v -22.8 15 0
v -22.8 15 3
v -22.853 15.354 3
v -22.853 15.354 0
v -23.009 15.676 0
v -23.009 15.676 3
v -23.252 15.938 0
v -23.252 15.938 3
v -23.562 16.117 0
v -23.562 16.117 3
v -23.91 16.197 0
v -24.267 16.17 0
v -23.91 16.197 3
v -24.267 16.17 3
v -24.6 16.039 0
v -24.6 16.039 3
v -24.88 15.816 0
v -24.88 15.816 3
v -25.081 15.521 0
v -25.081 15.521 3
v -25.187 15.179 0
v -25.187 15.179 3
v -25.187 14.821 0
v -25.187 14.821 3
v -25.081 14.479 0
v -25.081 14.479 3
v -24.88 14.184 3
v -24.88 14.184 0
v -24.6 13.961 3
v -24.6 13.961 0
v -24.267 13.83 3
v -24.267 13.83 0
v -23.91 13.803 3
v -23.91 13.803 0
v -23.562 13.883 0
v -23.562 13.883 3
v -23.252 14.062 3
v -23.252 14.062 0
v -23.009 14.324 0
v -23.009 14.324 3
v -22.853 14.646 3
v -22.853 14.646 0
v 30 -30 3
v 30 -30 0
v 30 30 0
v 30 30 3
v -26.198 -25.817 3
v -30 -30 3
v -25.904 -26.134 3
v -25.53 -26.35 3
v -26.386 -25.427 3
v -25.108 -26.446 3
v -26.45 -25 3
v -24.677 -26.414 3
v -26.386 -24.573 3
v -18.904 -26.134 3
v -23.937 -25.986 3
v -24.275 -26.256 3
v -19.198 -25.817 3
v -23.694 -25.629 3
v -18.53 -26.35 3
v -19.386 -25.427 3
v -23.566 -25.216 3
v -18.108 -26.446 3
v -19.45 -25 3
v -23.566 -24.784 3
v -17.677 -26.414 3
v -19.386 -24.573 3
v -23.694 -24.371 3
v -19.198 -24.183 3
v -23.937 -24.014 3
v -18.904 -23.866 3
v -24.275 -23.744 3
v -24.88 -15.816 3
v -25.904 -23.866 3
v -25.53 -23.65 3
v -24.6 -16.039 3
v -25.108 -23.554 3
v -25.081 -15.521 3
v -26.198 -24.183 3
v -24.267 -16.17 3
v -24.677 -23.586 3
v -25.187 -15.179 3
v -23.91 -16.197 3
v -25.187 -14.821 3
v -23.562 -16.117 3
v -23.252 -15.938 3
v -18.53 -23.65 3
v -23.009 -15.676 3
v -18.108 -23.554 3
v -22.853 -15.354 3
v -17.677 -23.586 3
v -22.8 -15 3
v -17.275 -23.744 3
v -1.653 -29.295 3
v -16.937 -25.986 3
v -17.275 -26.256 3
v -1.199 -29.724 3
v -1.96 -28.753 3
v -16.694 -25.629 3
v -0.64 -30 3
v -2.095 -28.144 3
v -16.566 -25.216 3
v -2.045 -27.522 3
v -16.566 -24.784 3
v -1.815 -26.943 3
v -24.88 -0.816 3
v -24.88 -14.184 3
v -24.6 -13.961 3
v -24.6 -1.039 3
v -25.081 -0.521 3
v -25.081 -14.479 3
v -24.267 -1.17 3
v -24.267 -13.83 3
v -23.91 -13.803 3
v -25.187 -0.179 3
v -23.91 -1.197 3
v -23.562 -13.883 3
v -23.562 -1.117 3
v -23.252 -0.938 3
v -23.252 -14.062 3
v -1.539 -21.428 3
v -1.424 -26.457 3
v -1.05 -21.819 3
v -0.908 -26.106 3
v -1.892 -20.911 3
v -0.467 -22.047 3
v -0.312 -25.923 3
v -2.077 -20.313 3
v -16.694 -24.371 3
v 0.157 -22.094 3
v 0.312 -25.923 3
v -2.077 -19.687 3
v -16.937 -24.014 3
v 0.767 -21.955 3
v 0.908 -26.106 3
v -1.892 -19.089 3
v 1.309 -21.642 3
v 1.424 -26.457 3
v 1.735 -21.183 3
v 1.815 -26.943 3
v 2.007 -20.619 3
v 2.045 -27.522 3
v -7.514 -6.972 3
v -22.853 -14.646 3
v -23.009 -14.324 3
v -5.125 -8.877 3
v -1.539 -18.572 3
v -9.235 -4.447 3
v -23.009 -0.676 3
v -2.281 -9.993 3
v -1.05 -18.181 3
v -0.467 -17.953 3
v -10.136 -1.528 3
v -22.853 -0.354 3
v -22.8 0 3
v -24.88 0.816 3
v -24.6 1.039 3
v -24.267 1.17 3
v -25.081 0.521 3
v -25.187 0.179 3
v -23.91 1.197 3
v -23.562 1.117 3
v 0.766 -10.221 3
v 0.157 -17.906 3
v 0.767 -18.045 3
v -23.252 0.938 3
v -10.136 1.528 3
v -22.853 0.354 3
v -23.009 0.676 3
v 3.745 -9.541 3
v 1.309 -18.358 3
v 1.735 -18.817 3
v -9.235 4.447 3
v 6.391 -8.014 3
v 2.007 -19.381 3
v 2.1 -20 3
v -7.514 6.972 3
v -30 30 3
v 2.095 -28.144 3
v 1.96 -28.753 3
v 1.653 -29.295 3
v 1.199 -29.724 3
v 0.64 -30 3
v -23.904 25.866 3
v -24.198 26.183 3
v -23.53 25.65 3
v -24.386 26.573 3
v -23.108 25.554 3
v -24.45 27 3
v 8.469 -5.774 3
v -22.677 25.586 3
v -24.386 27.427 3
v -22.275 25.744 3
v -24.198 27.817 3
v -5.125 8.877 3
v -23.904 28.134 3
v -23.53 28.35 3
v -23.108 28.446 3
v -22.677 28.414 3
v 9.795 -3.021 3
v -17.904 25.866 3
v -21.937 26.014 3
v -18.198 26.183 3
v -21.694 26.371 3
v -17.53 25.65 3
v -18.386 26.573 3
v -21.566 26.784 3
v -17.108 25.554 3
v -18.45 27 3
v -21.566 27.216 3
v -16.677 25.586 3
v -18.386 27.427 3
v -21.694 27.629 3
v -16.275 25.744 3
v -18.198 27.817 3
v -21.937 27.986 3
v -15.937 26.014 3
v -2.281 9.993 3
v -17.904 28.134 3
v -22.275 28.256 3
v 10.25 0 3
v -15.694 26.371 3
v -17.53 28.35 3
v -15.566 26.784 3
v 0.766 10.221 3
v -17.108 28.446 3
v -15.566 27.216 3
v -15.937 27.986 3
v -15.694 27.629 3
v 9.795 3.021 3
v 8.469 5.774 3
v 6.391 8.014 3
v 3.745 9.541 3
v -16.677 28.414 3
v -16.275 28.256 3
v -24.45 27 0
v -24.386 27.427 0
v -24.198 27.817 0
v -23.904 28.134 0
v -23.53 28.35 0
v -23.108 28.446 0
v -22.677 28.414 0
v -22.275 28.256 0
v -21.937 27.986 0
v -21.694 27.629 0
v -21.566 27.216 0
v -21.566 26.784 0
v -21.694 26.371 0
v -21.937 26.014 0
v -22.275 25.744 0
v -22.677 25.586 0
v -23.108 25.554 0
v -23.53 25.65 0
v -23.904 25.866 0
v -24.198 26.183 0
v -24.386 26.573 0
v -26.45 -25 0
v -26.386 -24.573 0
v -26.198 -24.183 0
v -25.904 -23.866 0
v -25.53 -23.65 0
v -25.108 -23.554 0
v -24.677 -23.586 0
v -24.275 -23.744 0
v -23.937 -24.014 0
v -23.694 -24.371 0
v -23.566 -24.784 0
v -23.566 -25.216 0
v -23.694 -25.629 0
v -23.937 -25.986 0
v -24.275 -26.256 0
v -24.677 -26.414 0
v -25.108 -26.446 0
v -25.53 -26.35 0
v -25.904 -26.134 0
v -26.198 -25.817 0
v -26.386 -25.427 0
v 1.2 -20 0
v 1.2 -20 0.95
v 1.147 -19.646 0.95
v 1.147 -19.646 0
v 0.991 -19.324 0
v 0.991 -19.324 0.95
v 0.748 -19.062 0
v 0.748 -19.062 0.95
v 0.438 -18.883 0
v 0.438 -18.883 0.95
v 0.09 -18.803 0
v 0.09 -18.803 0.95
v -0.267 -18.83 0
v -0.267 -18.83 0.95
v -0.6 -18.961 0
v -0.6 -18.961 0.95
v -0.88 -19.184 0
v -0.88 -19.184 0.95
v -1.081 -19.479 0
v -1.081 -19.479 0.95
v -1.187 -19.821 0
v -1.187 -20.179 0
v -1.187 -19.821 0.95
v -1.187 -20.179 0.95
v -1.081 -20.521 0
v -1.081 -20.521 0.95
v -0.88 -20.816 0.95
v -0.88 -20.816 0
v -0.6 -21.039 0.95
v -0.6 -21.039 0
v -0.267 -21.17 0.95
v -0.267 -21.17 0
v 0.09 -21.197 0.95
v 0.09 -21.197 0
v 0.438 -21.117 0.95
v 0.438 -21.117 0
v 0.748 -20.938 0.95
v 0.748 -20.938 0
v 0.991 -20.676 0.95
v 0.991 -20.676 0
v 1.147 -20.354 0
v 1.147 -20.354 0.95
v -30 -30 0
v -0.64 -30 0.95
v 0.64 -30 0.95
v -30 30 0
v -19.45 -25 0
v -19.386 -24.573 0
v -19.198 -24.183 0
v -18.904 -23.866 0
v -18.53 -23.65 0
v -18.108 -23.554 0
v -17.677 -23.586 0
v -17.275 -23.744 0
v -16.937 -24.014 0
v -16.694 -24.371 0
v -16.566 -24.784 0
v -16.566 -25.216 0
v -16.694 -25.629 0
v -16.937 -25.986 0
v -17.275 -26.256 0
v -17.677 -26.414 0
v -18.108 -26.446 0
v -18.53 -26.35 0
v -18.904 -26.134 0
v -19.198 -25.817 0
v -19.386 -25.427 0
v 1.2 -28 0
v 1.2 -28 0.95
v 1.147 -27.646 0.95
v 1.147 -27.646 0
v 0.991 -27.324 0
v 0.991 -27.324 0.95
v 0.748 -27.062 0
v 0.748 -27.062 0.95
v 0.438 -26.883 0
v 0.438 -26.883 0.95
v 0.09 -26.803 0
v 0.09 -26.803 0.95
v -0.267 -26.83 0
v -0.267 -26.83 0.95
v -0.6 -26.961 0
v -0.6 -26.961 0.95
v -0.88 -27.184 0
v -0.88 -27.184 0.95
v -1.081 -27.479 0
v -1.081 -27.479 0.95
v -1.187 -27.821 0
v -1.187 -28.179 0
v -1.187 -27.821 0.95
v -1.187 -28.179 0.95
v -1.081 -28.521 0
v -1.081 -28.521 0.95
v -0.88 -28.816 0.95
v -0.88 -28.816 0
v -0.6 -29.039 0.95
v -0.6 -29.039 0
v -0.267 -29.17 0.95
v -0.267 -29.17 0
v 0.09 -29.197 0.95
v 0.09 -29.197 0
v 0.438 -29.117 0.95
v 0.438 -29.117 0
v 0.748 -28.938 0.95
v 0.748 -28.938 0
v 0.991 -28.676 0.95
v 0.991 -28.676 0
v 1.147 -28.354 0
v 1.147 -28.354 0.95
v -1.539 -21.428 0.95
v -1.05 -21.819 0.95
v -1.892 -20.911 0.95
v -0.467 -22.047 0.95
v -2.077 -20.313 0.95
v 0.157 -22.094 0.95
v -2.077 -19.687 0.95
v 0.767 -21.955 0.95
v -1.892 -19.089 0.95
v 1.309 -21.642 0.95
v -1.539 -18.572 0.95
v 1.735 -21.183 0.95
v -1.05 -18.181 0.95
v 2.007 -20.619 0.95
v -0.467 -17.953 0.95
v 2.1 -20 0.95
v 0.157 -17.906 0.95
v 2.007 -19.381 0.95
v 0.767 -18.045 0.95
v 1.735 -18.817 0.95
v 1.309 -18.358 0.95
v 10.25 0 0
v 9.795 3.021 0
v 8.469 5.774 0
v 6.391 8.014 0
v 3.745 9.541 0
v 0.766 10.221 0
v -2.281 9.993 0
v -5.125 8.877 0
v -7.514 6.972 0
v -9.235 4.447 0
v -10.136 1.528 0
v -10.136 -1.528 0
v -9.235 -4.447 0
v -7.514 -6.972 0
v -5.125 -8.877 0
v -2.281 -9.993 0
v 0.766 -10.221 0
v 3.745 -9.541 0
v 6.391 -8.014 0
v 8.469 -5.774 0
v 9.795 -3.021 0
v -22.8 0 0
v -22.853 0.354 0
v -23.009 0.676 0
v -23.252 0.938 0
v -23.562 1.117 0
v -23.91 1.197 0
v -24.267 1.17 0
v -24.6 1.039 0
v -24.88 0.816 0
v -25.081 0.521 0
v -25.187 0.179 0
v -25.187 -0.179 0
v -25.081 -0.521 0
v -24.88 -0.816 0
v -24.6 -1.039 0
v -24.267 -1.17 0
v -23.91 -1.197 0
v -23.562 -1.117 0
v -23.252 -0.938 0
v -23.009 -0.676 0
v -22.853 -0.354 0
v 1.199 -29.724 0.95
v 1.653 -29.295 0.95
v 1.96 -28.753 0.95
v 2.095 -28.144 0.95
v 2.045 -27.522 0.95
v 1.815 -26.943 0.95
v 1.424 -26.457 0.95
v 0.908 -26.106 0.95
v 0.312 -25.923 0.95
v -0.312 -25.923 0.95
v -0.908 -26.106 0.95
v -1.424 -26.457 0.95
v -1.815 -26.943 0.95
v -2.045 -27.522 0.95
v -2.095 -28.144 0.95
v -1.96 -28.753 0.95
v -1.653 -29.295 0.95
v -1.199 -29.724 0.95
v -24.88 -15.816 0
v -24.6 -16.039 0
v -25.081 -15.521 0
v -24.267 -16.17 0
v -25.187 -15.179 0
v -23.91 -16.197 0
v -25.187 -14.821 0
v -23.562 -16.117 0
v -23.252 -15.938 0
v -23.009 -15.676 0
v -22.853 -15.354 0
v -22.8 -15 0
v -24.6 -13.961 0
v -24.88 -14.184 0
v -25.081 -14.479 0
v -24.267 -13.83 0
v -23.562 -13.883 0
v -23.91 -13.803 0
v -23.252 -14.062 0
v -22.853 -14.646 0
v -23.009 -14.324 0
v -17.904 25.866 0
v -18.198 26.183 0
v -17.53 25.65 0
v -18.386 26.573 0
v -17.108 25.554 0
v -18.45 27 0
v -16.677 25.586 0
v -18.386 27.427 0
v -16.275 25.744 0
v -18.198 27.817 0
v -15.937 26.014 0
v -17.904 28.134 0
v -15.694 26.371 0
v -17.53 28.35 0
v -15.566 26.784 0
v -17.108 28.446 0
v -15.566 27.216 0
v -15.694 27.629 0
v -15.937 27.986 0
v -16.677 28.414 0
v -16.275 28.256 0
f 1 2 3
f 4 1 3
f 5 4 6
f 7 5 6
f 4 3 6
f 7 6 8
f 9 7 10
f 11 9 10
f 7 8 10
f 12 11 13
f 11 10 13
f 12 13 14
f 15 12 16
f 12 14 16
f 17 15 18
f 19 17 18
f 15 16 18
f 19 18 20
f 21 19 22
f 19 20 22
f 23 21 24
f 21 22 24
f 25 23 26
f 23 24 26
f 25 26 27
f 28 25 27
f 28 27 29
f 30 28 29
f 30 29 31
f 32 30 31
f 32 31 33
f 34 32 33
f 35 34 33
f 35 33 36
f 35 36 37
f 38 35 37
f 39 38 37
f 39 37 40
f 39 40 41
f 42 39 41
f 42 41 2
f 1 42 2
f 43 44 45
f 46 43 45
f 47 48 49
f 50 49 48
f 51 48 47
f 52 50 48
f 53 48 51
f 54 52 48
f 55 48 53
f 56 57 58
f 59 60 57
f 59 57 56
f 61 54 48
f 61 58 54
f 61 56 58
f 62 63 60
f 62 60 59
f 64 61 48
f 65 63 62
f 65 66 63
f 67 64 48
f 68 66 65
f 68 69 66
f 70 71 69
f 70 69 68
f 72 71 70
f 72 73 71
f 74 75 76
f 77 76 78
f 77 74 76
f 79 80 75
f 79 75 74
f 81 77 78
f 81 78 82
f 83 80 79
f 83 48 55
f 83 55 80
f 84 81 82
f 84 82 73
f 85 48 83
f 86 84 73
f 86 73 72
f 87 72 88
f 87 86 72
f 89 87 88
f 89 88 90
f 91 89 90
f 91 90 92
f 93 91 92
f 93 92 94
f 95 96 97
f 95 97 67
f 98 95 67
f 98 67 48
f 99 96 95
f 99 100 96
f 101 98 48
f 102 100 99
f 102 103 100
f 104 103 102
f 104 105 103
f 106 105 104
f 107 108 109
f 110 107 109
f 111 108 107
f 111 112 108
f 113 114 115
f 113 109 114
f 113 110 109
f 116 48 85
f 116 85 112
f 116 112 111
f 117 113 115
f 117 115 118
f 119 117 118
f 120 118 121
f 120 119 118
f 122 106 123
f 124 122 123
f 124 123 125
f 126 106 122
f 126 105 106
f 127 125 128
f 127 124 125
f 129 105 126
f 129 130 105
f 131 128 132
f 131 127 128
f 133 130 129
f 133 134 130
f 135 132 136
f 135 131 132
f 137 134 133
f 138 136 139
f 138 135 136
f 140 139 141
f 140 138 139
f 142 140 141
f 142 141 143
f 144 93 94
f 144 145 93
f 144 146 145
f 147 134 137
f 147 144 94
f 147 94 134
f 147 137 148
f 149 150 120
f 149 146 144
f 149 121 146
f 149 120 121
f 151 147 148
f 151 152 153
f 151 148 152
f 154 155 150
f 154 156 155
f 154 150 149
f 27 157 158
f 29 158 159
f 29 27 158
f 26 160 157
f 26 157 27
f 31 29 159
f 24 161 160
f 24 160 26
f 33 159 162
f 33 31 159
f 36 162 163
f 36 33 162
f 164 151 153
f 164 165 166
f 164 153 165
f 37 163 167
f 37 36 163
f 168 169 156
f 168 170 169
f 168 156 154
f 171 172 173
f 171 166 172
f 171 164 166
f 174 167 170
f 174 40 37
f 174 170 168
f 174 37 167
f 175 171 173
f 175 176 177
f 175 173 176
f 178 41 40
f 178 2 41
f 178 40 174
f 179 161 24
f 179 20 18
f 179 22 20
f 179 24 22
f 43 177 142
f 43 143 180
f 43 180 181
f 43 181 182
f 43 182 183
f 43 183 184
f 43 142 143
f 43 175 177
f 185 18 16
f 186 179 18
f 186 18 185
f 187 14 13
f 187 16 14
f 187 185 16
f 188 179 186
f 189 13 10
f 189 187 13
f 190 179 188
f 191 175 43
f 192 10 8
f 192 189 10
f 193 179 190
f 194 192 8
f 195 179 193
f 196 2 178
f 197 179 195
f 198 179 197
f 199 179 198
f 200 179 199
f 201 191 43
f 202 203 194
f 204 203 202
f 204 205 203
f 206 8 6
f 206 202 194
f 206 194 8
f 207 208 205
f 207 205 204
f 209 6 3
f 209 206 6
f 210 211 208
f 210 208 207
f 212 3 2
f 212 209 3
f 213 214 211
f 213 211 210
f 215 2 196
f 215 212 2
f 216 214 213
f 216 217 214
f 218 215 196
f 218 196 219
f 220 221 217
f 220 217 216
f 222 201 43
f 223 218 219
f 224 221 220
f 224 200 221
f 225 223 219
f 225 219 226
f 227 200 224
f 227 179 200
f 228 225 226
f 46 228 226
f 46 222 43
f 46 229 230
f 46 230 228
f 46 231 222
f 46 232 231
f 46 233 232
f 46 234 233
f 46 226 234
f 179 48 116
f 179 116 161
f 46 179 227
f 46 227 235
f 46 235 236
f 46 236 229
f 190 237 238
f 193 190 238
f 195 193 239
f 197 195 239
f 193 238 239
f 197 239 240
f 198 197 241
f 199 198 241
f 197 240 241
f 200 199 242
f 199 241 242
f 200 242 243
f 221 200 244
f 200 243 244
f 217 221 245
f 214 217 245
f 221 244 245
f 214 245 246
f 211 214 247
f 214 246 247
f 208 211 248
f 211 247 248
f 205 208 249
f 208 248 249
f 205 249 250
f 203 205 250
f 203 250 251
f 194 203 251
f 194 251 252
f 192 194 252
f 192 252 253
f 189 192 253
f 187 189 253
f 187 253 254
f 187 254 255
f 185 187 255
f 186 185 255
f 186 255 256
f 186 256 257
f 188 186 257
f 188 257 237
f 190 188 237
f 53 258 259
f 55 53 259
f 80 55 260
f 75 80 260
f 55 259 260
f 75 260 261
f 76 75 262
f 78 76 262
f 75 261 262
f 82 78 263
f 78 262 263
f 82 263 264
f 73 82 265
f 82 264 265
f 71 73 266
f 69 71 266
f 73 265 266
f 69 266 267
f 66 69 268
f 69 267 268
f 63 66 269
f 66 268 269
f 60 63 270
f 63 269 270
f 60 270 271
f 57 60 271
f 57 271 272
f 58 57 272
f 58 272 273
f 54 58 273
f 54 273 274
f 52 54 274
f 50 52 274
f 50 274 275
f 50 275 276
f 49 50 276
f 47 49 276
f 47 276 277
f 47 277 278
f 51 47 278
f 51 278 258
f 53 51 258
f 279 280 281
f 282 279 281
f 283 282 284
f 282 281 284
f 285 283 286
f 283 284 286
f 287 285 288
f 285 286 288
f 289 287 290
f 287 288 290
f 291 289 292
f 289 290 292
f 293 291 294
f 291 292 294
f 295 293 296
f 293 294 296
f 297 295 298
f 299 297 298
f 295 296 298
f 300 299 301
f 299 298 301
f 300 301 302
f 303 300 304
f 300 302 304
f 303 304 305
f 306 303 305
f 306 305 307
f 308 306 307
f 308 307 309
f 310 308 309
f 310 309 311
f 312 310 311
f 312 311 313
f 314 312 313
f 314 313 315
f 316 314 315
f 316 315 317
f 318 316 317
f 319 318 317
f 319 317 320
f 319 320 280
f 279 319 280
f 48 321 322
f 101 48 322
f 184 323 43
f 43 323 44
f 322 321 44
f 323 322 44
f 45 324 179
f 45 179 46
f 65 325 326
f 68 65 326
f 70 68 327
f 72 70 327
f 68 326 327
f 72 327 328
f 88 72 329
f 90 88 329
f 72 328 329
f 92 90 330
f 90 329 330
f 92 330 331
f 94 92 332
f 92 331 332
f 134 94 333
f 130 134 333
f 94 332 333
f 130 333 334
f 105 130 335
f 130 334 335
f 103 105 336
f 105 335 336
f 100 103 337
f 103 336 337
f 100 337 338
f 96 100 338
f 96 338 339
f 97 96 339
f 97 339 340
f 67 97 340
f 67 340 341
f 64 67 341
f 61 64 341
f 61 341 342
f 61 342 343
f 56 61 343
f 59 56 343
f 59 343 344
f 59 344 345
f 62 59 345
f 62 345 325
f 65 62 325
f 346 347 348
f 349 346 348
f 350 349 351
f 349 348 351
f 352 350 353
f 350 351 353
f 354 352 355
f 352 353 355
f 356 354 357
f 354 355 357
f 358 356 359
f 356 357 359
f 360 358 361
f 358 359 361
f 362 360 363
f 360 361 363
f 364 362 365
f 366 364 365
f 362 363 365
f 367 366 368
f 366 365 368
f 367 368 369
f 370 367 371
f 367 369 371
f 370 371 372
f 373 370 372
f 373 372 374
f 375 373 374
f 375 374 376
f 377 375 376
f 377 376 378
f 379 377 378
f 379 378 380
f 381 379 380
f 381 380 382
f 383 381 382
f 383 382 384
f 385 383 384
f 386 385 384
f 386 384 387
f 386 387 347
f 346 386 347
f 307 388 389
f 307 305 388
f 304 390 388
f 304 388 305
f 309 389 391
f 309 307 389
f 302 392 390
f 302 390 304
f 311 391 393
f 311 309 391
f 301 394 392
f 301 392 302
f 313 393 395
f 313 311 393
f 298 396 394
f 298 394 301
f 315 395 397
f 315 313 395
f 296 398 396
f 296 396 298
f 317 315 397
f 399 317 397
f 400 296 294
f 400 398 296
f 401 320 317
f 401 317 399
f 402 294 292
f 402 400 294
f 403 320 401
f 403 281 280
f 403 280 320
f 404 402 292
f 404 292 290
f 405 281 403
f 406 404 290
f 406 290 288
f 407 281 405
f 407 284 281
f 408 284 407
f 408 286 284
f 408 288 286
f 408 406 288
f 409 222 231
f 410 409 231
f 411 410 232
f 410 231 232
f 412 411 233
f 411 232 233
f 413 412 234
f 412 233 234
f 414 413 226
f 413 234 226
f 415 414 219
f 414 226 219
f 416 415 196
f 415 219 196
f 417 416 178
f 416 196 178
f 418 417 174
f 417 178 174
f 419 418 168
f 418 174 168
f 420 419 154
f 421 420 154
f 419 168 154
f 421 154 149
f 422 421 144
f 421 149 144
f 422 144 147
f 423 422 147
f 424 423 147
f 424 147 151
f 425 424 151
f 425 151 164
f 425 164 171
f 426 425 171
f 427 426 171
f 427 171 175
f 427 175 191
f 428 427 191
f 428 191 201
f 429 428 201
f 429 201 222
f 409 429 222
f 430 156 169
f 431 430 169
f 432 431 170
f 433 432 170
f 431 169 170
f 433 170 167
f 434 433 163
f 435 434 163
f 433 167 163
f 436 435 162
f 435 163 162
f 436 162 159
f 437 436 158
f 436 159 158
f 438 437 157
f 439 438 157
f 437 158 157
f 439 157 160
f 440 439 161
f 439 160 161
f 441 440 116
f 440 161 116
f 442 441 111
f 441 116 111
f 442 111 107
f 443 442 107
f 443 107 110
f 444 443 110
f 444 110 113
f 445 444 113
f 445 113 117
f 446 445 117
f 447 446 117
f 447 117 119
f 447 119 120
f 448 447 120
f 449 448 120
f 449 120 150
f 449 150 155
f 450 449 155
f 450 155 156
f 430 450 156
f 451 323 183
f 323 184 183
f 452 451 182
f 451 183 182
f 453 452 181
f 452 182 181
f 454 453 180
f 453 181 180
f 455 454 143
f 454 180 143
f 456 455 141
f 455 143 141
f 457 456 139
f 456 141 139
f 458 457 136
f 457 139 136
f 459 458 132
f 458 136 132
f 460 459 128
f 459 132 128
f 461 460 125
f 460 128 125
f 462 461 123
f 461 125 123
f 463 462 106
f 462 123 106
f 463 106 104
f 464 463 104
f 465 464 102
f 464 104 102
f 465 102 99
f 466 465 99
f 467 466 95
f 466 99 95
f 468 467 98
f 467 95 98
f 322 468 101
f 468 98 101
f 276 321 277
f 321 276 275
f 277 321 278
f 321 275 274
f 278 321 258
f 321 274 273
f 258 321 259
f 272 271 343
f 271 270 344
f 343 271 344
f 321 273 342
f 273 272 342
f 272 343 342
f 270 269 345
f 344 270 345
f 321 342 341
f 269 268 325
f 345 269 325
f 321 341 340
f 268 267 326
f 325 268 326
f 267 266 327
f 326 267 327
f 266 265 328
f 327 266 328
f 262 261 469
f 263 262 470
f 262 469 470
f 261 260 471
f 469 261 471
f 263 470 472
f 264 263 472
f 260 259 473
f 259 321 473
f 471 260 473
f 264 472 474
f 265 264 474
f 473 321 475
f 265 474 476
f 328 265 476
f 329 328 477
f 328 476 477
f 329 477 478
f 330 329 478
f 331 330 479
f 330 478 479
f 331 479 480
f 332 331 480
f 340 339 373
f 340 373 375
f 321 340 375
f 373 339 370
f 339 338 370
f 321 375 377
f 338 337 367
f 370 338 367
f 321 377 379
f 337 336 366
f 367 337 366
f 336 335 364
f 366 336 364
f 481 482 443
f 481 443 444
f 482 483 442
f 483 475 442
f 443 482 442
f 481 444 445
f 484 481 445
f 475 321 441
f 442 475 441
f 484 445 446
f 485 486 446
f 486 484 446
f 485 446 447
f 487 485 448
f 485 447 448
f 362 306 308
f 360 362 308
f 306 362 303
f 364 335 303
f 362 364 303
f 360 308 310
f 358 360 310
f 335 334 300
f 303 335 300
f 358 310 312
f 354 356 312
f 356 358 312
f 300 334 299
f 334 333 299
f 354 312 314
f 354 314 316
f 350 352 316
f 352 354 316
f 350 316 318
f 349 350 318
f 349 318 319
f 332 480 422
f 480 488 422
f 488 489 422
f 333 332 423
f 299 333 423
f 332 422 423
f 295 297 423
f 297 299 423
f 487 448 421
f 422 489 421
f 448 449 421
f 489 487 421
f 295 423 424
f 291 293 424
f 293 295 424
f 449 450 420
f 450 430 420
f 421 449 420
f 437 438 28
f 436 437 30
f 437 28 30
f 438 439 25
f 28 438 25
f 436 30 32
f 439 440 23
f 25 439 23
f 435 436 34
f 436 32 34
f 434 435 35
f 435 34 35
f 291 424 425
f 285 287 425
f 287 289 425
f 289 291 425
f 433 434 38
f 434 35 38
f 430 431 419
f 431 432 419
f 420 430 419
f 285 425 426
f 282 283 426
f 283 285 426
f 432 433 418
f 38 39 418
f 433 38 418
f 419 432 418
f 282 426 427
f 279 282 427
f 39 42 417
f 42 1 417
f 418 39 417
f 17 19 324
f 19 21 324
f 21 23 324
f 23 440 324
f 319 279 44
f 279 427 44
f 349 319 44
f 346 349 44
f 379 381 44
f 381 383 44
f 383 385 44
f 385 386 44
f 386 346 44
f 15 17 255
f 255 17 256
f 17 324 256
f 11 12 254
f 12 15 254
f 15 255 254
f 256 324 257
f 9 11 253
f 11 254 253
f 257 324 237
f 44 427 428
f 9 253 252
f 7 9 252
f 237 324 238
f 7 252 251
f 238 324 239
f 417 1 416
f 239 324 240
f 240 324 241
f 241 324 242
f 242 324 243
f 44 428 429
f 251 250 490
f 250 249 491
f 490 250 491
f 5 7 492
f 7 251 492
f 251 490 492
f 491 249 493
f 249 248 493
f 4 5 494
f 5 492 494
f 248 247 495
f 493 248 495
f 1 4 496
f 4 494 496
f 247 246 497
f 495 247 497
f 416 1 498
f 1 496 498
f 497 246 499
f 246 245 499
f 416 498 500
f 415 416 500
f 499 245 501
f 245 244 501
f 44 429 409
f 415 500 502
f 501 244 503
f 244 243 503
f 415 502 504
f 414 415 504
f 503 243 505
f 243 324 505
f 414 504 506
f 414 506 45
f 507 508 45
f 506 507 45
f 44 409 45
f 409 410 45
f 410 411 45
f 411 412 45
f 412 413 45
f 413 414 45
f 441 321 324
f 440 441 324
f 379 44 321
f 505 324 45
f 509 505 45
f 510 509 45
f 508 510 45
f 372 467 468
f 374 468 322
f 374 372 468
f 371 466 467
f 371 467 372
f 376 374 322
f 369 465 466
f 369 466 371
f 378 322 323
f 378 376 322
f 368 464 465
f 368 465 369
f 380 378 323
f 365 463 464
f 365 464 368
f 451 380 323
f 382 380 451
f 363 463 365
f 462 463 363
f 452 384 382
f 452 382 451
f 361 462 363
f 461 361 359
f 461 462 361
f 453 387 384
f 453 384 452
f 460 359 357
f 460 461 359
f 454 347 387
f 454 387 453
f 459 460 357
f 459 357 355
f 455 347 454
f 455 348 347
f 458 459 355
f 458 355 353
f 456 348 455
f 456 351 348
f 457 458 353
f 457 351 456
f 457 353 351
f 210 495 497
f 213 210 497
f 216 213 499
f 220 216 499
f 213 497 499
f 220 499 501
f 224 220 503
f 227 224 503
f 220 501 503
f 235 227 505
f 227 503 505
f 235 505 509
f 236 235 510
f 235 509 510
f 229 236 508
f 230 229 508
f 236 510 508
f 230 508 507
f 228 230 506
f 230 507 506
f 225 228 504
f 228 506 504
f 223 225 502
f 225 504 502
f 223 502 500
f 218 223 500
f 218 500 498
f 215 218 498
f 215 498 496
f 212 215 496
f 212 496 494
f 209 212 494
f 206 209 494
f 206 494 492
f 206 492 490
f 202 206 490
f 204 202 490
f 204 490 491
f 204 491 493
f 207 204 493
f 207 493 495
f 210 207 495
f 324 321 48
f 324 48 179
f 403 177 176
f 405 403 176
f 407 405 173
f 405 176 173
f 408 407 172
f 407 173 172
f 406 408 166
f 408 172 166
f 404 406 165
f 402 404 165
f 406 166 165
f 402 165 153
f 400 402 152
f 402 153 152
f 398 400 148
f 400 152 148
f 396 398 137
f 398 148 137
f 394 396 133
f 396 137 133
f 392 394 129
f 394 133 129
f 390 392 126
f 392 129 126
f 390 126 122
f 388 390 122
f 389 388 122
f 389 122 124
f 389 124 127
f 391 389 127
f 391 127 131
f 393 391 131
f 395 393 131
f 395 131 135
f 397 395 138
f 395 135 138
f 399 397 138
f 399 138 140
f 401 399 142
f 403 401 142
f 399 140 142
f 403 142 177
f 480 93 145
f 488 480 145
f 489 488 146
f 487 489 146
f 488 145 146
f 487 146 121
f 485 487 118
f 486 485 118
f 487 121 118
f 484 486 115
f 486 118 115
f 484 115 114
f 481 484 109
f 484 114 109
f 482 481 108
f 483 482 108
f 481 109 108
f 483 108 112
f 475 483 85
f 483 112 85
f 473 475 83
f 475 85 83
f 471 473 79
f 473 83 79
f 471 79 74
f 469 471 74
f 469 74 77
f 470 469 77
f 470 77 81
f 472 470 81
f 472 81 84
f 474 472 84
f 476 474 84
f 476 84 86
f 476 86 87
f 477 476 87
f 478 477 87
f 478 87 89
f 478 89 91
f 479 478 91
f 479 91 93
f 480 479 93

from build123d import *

# Parameters (mm, degrees)
SKETCH1_W                              = 60
SKETCH1_H                              = 60
BOSS_EXTRUDE1_DEPTH                    = 3
SKETCH2_R                              = 10.25
CUT_EXTRUDE1_DEPTH                     = 43.532340636
SKETCH3_R                              = 1.45
SERVO_Y_MOUNT_D2P9_DEPTH               = 3.01
SKETCH4_R                              = 1.45
CUT_EXTRUDE5_DEPTH                     = 43.532340636
SKETCH5_R                              = 1.2
GUIDERAIL1_D2P4_DEPTH                  = 3.01
SKETCH6_R                              = 1.2
GUIDEBLOCK2_D2P4_DEPTH                 = 3.01
SKETCH7_R                              = 2.1
GUIDEBLOCK2_HEADCOUNTERBORE_D4P2_DEPTH = 2.05


with BuildPart() as part:
    # Sketch1 → Boss-Extrude1 (new body)
    with BuildSketch(Plane.XY):
        Rectangle(SKETCH1_W, SKETCH1_H)
    extrude(amount=BOSS_EXTRUDE1_DEPTH)

    # Sketch2 → Cut-Extrude1 (cut, through all)
    with BuildSketch(Plane.XY.offset(3)):
        Circle(SKETCH2_R)
    extrude(amount=-CUT_EXTRUDE1_DEPTH, mode=Mode.SUBTRACT)

    # Sketch3 → Servo_Y_Mount_D2p9 (cut)
    with BuildSketch(Plane(origin=(0, 0, 0), x_dir=(-1, 0, 0), z_dir=(0, 0, -1))):
        with Locations((18, -25)):
            Circle(SKETCH3_R)
        with Locations((25, -25)):
            Circle(SKETCH3_R)
    extrude(amount=-SERVO_Y_MOUNT_D2P9_DEPTH, mode=Mode.SUBTRACT)

    # Sketch4 → Cut-Extrude5 (cut, through all)
    with BuildSketch(Plane(origin=(0, 0, 0), x_dir=(-1, 0, 0), z_dir=(0, 0, -1))):
        with Locations((17, 27)):
            Circle(SKETCH4_R)
        with Locations((23, 27)):
            Circle(SKETCH4_R)
    extrude(amount=-CUT_EXTRUDE5_DEPTH, mode=Mode.SUBTRACT)

    # Sketch5 → GuideRail1_D2p4 (cut)
    with BuildSketch(Plane.XY.offset(3)):
        with Locations((-24, -15)):
            Circle(SKETCH5_R)
        with Locations((-24, 0)):
            Circle(SKETCH5_R)
        with Locations((-24, 15)):
            Circle(SKETCH5_R)
    extrude(amount=-GUIDERAIL1_D2P4_DEPTH, mode=Mode.SUBTRACT)

    # Sketch6 → GuideBlock2_D2p4 (cut)
    with BuildSketch(Plane.XY.offset(3)):
        with Locations((0, -28)):
            Circle(SKETCH6_R)
        with Locations((0, -20)):
            Circle(SKETCH6_R)
    extrude(amount=-GUIDEBLOCK2_D2P4_DEPTH, mode=Mode.SUBTRACT)

    # Sketch7 → GuideBlock2_HeadCounterbore_D4p2 (cut)
    with BuildSketch(Plane.XY.offset(3)):
        with Locations((0, -28)):
            Circle(SKETCH7_R)
        with Locations((0, -20)):
            Circle(SKETCH7_R)
    extrude(amount=-GUIDEBLOCK2_HEADCOUNTERBORE_D4P2_DEPTH, mode=Mode.SUBTRACT)


solid = part.part
